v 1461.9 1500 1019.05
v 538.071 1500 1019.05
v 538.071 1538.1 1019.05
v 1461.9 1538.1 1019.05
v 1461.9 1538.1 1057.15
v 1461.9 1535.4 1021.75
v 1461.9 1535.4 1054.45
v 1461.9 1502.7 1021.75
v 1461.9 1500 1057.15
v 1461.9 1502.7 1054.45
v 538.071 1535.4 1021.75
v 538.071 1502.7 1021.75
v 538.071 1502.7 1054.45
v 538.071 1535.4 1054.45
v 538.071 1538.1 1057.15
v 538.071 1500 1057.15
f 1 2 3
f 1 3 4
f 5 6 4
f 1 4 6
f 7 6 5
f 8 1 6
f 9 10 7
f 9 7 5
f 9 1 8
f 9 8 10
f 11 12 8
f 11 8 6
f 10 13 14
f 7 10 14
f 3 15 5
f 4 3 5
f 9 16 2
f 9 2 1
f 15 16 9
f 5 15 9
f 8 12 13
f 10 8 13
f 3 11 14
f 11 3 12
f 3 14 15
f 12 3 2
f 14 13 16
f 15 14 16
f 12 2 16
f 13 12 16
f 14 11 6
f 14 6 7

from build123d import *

# Parameters (mm, degrees)
SKETCH024_W     = 1423.8
SKETCH024_H     = 38.1
PAD012_DEPTH    = 38.1
SKETCH025_W     = 32.7
SKETCH025_H     = 32.7
POCKET009_DEPTH = 1423.801
SKETCH030_W     = 499.970518
SKETCH030_H     = 38.1
POCKET011_DEPTH = 38.101


with BuildPart() as part:
    # Sketch024 (on Face1 of Binder005) → Pad012 (new body)
    with BuildSketch(Plane.XZ.offset(38.1)):
        with Locations((750, 1038.1)):
            Rectangle(SKETCH024_W, SKETCH024_H)
    extrude(amount=-PAD012_DEPTH)

    # Sketch025 (on Face1 of Pad012) → Pocket009 (cut, through all)
    with BuildSketch(Plane.YZ.offset(1461.9)):
        with Locations((-19.05, 1038.1)):
            Rectangle(SKETCH025_W, SKETCH025_H)
    extrude(amount=-POCKET009_DEPTH, mode=Mode.SUBTRACT)

    # Sketch030 (on Face3 of Pocket009) → Pocket011 (cut, through all)
    with BuildSketch(Plane.XZ.offset(38.1)):
        with Locations((288.085259, 1038.1)):
            Rectangle(SKETCH030_W, SKETCH030_H)
    extrude(amount=-POCKET011_DEPTH, mode=Mode.SUBTRACT)


with BuildPart() as part_1:
    # Body012 placement: moved
    add(part.part.moved(Location((0, 1538.1, 0))))


solid = part_1.part
